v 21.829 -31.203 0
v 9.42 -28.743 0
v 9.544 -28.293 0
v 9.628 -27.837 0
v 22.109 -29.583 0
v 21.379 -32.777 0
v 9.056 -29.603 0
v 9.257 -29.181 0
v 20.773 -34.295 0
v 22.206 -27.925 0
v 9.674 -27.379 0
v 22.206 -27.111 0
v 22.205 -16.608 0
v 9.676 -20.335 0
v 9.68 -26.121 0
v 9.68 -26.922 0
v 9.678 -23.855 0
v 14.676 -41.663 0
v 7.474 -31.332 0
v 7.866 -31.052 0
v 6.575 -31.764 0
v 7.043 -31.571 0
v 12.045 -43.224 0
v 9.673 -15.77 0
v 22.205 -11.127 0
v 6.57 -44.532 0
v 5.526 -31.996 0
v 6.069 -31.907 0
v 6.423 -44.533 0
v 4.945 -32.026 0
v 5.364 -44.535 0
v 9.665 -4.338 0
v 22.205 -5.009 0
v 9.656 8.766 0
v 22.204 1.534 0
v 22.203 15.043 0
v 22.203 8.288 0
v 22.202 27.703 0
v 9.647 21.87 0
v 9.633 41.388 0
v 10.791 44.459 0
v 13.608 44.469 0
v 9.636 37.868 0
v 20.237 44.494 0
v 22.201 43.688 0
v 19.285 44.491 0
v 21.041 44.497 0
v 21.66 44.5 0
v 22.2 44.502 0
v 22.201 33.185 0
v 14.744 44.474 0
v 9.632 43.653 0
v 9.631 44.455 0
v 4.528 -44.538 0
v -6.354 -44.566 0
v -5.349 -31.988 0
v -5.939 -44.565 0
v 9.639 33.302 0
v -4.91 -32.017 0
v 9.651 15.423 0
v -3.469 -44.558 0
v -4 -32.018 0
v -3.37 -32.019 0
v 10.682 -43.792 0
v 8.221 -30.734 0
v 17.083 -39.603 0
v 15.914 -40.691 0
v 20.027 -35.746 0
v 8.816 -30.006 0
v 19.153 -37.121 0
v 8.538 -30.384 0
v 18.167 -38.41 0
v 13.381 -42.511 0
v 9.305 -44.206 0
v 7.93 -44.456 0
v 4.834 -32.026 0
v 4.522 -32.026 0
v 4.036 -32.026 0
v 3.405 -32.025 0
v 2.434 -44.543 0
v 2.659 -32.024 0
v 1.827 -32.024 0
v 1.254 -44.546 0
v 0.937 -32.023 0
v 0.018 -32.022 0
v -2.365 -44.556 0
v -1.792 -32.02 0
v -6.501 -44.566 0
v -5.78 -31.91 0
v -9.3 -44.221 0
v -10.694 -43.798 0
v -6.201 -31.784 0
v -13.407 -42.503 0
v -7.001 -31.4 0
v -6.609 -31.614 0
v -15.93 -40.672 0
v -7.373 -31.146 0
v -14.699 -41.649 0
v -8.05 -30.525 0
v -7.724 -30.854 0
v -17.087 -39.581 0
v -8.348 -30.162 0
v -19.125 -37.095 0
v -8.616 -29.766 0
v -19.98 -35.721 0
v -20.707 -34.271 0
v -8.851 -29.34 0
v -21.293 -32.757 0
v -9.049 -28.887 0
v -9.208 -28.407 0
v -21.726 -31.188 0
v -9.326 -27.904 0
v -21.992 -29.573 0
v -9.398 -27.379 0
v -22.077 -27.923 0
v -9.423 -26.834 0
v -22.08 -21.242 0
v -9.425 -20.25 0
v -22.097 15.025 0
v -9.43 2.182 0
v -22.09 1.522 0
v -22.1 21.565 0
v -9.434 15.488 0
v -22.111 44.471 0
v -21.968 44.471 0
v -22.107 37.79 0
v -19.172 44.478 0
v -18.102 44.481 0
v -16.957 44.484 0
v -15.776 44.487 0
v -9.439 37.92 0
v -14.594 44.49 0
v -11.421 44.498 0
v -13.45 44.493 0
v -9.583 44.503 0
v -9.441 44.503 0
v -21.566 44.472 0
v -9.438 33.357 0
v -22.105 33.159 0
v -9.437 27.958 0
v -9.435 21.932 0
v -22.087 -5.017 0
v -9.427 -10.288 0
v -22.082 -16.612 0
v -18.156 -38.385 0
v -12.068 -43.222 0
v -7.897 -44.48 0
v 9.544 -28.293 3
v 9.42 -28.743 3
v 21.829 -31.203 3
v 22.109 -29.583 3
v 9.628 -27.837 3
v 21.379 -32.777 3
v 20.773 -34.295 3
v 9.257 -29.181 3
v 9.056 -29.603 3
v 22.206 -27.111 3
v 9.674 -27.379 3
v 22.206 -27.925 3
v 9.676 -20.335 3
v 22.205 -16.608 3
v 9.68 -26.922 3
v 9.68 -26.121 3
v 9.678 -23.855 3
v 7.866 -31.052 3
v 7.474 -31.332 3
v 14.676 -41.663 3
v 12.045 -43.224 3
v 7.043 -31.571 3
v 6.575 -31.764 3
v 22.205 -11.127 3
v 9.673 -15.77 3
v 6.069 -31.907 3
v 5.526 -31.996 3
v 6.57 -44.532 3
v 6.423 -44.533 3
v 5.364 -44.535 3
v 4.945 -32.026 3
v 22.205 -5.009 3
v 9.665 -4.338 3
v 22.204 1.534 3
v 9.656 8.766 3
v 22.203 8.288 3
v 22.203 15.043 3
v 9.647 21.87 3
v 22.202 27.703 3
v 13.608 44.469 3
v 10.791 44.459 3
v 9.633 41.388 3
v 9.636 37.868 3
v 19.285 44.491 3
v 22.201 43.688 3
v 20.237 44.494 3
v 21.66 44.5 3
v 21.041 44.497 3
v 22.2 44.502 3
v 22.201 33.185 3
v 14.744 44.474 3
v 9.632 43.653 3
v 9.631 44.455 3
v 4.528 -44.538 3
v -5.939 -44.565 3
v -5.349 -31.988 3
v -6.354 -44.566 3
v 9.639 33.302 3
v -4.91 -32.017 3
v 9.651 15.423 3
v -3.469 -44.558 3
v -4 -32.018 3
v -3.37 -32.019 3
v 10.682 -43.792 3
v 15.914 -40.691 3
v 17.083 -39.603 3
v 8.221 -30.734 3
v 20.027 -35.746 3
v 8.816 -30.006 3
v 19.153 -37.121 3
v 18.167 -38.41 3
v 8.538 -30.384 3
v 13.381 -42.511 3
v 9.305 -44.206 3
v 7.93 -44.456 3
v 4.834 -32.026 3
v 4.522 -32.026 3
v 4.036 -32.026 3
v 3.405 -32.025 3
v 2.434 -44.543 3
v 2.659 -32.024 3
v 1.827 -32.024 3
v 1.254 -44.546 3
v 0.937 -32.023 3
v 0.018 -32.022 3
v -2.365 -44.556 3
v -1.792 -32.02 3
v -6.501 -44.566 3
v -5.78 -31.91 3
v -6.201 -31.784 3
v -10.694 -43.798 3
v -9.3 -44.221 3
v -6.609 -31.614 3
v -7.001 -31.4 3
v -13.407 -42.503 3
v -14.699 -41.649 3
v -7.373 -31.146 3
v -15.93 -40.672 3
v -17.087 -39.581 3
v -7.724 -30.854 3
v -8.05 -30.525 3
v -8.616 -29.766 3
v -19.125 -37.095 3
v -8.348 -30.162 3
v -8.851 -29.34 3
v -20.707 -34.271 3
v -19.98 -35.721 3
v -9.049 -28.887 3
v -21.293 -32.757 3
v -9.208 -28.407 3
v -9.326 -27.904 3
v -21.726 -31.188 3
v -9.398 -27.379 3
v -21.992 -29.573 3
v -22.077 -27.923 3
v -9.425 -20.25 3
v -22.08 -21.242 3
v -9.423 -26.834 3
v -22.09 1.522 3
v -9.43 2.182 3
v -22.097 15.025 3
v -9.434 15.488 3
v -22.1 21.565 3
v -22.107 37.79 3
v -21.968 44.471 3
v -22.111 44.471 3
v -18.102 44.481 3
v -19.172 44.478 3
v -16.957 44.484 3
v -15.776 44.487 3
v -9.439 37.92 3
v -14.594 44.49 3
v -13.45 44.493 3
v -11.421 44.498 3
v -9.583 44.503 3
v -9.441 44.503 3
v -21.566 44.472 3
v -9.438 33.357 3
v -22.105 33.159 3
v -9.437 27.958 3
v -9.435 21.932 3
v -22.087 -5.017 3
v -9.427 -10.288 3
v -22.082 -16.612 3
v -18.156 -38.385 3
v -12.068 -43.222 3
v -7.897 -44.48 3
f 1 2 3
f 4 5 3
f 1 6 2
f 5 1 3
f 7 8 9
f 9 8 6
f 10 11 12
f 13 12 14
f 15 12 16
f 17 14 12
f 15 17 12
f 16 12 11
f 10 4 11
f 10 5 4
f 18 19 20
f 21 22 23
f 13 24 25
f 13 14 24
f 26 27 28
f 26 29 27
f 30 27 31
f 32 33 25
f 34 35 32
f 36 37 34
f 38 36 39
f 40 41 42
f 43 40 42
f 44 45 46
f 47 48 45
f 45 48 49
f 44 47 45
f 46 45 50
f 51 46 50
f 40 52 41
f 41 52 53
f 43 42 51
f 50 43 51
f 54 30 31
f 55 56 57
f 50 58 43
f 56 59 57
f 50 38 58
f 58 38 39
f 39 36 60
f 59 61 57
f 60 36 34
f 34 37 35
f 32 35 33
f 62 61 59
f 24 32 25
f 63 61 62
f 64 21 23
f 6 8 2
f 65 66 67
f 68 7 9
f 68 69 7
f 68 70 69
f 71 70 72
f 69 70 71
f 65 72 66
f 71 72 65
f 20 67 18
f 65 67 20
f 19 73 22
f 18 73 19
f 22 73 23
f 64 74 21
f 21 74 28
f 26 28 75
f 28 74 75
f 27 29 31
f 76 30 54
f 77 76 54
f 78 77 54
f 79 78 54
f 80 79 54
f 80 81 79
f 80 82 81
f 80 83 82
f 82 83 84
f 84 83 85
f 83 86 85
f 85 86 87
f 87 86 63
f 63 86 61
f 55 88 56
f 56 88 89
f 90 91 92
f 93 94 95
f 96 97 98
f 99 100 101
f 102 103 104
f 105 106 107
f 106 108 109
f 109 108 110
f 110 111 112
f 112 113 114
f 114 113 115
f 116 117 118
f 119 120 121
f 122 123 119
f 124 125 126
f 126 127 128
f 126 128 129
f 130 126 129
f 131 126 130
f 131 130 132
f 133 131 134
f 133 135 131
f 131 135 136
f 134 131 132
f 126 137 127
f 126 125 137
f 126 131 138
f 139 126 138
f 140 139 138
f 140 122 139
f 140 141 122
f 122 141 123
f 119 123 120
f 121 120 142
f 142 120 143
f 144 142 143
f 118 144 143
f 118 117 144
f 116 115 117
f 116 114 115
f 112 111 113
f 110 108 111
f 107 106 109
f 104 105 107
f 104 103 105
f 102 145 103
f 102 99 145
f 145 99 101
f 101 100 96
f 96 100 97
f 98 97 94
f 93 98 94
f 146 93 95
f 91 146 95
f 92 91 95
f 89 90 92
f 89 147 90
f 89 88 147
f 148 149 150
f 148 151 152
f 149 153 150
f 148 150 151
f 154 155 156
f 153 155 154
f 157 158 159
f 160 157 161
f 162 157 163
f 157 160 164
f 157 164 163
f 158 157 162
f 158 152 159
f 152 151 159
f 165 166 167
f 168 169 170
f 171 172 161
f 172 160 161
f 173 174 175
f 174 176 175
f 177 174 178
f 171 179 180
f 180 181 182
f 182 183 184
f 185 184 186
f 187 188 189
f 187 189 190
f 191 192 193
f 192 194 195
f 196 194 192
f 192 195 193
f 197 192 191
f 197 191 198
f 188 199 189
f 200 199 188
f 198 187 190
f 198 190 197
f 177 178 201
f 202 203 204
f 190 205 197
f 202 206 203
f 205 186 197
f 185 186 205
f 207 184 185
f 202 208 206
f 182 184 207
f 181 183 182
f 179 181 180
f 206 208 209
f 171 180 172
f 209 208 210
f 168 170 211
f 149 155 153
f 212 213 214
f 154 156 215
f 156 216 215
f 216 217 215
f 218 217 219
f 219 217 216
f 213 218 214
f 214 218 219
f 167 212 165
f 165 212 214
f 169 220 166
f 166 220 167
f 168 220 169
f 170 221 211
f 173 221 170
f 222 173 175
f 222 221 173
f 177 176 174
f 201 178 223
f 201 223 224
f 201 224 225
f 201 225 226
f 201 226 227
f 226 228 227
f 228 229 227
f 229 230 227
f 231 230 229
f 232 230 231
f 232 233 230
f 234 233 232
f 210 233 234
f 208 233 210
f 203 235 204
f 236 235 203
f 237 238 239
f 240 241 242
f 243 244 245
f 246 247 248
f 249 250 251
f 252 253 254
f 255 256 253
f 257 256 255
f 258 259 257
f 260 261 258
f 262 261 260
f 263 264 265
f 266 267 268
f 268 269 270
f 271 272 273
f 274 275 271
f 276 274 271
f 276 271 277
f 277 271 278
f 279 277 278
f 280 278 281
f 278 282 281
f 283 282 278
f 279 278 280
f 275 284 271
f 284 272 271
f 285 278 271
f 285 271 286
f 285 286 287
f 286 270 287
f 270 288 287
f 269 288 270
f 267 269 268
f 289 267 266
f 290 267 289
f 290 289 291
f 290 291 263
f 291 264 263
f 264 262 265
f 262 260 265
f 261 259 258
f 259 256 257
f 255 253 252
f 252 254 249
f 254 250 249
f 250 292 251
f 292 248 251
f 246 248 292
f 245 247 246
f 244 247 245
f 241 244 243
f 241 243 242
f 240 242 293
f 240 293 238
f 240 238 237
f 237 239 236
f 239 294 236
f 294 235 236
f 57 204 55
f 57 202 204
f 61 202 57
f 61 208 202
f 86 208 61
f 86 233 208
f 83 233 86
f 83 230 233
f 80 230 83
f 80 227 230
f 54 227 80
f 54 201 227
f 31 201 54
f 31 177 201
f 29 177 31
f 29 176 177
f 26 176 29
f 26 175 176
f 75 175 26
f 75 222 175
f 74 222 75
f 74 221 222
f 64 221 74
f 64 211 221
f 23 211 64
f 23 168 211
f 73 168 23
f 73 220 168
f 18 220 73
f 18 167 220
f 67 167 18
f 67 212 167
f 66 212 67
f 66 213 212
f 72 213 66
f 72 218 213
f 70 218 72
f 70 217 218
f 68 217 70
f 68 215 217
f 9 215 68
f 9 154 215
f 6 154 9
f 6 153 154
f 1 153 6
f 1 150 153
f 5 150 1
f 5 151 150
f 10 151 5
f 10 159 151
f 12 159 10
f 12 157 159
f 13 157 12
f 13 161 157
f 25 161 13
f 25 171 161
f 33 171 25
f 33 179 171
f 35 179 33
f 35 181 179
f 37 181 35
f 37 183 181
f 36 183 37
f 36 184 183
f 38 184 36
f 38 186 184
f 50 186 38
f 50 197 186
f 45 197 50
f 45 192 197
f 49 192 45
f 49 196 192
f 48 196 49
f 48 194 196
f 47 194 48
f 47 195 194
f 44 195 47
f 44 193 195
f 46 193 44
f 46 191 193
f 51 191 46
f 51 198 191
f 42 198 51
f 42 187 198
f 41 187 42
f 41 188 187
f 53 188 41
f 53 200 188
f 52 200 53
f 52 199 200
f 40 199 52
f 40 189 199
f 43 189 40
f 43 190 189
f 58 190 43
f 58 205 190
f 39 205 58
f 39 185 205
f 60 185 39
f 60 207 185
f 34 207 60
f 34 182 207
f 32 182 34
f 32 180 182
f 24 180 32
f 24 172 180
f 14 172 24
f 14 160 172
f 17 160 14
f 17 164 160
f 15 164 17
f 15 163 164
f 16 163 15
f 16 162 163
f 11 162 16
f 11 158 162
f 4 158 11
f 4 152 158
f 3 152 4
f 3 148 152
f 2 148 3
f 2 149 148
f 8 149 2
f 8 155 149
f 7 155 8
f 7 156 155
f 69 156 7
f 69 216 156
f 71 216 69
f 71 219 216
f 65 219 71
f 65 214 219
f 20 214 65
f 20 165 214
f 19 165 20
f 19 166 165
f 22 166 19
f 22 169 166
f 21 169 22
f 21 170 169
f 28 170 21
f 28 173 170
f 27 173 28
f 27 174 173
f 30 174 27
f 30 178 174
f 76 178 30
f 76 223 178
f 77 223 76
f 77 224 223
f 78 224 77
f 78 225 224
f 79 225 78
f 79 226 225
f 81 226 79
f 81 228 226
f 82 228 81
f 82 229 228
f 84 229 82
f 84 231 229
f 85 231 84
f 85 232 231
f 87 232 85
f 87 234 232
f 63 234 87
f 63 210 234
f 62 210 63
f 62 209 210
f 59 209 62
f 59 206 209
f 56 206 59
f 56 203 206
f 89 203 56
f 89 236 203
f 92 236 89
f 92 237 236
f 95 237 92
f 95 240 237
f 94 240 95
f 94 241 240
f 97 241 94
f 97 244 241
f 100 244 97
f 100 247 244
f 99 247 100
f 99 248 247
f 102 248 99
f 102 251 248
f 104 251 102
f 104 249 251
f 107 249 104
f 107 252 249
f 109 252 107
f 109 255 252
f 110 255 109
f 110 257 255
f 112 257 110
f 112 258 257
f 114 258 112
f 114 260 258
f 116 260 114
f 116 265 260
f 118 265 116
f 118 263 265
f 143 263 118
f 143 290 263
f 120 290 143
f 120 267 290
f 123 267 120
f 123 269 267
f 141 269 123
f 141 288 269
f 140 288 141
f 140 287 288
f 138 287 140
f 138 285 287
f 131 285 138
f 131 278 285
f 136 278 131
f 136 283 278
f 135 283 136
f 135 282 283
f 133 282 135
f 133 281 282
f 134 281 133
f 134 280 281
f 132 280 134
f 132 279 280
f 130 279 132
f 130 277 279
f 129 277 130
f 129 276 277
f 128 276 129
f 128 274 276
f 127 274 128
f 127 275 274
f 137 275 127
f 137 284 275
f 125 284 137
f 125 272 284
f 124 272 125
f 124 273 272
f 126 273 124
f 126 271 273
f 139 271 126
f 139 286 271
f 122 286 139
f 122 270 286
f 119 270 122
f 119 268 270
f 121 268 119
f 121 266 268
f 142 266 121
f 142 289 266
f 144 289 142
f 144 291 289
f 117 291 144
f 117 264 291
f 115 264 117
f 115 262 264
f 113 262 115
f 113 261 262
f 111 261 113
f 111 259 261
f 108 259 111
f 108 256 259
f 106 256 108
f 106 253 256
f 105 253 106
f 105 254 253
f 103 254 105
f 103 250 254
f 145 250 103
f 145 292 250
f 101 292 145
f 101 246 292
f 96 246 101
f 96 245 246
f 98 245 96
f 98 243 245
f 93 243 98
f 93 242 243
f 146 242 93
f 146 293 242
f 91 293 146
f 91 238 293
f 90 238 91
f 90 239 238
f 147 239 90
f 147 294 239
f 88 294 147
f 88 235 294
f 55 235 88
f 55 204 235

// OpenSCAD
// Generated from 交通部公路局（原交通部公路總局）「新式號牌使用之英文字、數字字體」author trace
fudge = 0.1;

module glyph_2012_U(h = 3) {
  difference() {
    linear_extrude(height = h)
      polygon(points = [[-22.1106, 44.4706], [-22.1102, 43.6576], [-22.1091, 41.3599], [-22.1074, 37.7897], [-22.1053, 33.1591], [-22.1027, 27.68], [-22.0998, 21.5647], [-22.0968, 15.0253], [-22.0936, 8.2737], [-22.0904, 1.5221], [-22.0874, -5.0173], [-22.0845, -11.1326], [-22.0819, -16.6117], [-22.0798, -21.2423], [-22.0781, -24.8125], [-22.077, -27.1102], [-22.0766, -27.9232], [-21.9917, -29.5732], [-21.7262, -31.1878], [-21.2935, -32.7572], [-20.7068, -34.2715], [-19.9796, -35.7208], [-19.125, -37.0954], [-18.1564, -38.3854], [-17.087, -39.5809], [-15.9302, -40.6722], [-14.6993, -41.6495], [-13.4075, -42.5028], [-12.0681, -43.2223], [-10.6944, -43.7983], [-9.2998, -44.2208], [-7.8975, -44.4801], [-6.5008, -44.5663], [-6.354, -44.5659], [-5.9392, -44.5649], [-5.2946, -44.5632], [-4.4585, -44.561], [-3.4692, -44.5584], [-2.3651, -44.5556], [-1.1844, -44.5525], [0.0346, -44.5493], [1.2537, -44.5461], [2.4344, -44.5431], [3.5385, -44.5402], [4.5278, -44.5376], [5.3639, -44.5355], [6.0085, -44.5338], [6.4233, -44.5327], [6.5701, -44.5323], [7.9302, -44.4563], [9.3055, -44.2064], [10.6819, -43.7924], [12.0452, -43.2241], [13.3812, -42.5112], [14.6756, -41.6635], [15.9142, -40.6909], [17.0828, -39.603], [18.1672, -38.4096], [19.1532, -37.1206], [20.0266, -35.7457], [20.7731, -34.2947], [21.3786, -32.7773], [21.8287, -31.2034], [22.1094, -29.5826], [22.2064, -27.9248], [22.2064, -27.1115], [22.2062, -24.8128], [22.2059, -21.2409], [22.2055, -16.6082], [22.2051, -11.1267], [22.2046, -5.0086], [22.204, 1.5338], [22.2035, 8.2884], [22.2029, 15.043], [22.2024, 21.5855], [22.2019, 27.7035], [22.2015, 33.185], [22.2011, 37.8178], [22.2008, 41.3896], [22.2006, 43.6883], [22.2005, 44.5017], [22.0594, 44.5012], [21.6605, 44.4997], [21.0406, 44.4973], [20.2366, 44.4943], [19.2853, 44.4908], [18.2235, 44.4868], [17.0881, 44.4825], [15.9159, 44.4781], [14.7436, 44.4737], [13.6082, 44.4695], [12.5465, 44.4655], [11.5952, 44.4619], [10.7912, 44.4589], [10.1713, 44.4566], [9.7724, 44.4551], [9.6312, 44.4546], [9.6318, 43.653], [9.6333, 41.3876], [9.6357, 37.8676], [9.6389, 33.3019], [9.6426, 27.8999], [9.6467, 21.8705], [9.6512, 15.4229], [9.6557, 8.7662], [9.6603, 2.1094], [9.6648, -4.3382], [9.6689, -10.3676], [9.6726, -15.7696], [9.6758, -20.3352], [9.6782, -23.8553], [9.6797, -26.1207], [9.6803, -26.9223], [9.674, -27.379], [9.6284, -27.8375], [9.5436, -28.2935], [9.4199, -28.7426], [9.2572, -29.1806], [9.0559, -29.603], [8.816, -30.0057], [8.5377, -30.3842], [8.2211, -30.7344], [7.8664, -31.0517], [7.4736, -31.332], [7.043, -31.5709], [6.5748, -31.7641], [6.0689, -31.9073], [5.5256, -31.9962], [4.9451, -32.0264], [4.8344, -32.0263], [4.5216, -32.0261], [4.0356, -32.0256], [3.4053, -32.025], [2.6594, -32.0244], [1.827, -32.0236], [0.9368, -32.0228], [0.0177, -32.0219], [-0.9014, -32.0211], [-1.7916, -32.0203], [-2.6241, -32.0195], [-3.3699, -32.0188], [-4.0003, -32.0183], [-4.4863, -32.0178], [-4.7991, -32.0175], [-4.9097, -32.0174], [-5.3488, -31.9881], [-5.7804, -31.9096], [-6.2014, -31.7841], [-6.6092, -31.6137], [-7.0008, -31.4005], [-7.3734, -31.1465], [-7.7241, -30.8541], [-8.0501, -30.5251], [-8.3484, -30.1618], [-8.6163, -29.7662], [-8.8508, -29.3405], [-9.0491, -28.8868], [-9.2084, -28.4072], [-9.3258, -27.9037], [-9.3983, -27.3786], [-9.4232, -26.8339], [-9.4234, -26.0327], [-9.424, -23.7686], [-9.4249, -20.2505], [-9.426, -15.6875], [-9.4273, -10.2884], [-9.4288, -4.2624], [-9.4304, 2.1817], [-9.4321, 8.8347], [-9.4338, 15.4877], [-9.4354, 21.9317], [-9.4368, 27.9578], [-9.4382, 33.3568], [-9.4393, 37.9199], [-9.4402, 41.438], [-9.4408, 43.7021], [-9.441, 44.5033], [-9.5832, 44.5029], [-9.9854, 44.5019], [-10.6102, 44.5003], [-11.4206, 44.4982], [-12.3795, 44.4957], [-13.4497, 44.4929], [-14.5942, 44.49], [-15.7758, 44.4869], [-16.9573, 44.4839], [-18.1018, 44.4809], [-19.1721, 44.4782], [-20.1309, 44.4757], [-20.9413, 44.4736], [-21.5662, 44.472], [-21.9683, 44.471]]);
  }
}

glyph_2012_U();
